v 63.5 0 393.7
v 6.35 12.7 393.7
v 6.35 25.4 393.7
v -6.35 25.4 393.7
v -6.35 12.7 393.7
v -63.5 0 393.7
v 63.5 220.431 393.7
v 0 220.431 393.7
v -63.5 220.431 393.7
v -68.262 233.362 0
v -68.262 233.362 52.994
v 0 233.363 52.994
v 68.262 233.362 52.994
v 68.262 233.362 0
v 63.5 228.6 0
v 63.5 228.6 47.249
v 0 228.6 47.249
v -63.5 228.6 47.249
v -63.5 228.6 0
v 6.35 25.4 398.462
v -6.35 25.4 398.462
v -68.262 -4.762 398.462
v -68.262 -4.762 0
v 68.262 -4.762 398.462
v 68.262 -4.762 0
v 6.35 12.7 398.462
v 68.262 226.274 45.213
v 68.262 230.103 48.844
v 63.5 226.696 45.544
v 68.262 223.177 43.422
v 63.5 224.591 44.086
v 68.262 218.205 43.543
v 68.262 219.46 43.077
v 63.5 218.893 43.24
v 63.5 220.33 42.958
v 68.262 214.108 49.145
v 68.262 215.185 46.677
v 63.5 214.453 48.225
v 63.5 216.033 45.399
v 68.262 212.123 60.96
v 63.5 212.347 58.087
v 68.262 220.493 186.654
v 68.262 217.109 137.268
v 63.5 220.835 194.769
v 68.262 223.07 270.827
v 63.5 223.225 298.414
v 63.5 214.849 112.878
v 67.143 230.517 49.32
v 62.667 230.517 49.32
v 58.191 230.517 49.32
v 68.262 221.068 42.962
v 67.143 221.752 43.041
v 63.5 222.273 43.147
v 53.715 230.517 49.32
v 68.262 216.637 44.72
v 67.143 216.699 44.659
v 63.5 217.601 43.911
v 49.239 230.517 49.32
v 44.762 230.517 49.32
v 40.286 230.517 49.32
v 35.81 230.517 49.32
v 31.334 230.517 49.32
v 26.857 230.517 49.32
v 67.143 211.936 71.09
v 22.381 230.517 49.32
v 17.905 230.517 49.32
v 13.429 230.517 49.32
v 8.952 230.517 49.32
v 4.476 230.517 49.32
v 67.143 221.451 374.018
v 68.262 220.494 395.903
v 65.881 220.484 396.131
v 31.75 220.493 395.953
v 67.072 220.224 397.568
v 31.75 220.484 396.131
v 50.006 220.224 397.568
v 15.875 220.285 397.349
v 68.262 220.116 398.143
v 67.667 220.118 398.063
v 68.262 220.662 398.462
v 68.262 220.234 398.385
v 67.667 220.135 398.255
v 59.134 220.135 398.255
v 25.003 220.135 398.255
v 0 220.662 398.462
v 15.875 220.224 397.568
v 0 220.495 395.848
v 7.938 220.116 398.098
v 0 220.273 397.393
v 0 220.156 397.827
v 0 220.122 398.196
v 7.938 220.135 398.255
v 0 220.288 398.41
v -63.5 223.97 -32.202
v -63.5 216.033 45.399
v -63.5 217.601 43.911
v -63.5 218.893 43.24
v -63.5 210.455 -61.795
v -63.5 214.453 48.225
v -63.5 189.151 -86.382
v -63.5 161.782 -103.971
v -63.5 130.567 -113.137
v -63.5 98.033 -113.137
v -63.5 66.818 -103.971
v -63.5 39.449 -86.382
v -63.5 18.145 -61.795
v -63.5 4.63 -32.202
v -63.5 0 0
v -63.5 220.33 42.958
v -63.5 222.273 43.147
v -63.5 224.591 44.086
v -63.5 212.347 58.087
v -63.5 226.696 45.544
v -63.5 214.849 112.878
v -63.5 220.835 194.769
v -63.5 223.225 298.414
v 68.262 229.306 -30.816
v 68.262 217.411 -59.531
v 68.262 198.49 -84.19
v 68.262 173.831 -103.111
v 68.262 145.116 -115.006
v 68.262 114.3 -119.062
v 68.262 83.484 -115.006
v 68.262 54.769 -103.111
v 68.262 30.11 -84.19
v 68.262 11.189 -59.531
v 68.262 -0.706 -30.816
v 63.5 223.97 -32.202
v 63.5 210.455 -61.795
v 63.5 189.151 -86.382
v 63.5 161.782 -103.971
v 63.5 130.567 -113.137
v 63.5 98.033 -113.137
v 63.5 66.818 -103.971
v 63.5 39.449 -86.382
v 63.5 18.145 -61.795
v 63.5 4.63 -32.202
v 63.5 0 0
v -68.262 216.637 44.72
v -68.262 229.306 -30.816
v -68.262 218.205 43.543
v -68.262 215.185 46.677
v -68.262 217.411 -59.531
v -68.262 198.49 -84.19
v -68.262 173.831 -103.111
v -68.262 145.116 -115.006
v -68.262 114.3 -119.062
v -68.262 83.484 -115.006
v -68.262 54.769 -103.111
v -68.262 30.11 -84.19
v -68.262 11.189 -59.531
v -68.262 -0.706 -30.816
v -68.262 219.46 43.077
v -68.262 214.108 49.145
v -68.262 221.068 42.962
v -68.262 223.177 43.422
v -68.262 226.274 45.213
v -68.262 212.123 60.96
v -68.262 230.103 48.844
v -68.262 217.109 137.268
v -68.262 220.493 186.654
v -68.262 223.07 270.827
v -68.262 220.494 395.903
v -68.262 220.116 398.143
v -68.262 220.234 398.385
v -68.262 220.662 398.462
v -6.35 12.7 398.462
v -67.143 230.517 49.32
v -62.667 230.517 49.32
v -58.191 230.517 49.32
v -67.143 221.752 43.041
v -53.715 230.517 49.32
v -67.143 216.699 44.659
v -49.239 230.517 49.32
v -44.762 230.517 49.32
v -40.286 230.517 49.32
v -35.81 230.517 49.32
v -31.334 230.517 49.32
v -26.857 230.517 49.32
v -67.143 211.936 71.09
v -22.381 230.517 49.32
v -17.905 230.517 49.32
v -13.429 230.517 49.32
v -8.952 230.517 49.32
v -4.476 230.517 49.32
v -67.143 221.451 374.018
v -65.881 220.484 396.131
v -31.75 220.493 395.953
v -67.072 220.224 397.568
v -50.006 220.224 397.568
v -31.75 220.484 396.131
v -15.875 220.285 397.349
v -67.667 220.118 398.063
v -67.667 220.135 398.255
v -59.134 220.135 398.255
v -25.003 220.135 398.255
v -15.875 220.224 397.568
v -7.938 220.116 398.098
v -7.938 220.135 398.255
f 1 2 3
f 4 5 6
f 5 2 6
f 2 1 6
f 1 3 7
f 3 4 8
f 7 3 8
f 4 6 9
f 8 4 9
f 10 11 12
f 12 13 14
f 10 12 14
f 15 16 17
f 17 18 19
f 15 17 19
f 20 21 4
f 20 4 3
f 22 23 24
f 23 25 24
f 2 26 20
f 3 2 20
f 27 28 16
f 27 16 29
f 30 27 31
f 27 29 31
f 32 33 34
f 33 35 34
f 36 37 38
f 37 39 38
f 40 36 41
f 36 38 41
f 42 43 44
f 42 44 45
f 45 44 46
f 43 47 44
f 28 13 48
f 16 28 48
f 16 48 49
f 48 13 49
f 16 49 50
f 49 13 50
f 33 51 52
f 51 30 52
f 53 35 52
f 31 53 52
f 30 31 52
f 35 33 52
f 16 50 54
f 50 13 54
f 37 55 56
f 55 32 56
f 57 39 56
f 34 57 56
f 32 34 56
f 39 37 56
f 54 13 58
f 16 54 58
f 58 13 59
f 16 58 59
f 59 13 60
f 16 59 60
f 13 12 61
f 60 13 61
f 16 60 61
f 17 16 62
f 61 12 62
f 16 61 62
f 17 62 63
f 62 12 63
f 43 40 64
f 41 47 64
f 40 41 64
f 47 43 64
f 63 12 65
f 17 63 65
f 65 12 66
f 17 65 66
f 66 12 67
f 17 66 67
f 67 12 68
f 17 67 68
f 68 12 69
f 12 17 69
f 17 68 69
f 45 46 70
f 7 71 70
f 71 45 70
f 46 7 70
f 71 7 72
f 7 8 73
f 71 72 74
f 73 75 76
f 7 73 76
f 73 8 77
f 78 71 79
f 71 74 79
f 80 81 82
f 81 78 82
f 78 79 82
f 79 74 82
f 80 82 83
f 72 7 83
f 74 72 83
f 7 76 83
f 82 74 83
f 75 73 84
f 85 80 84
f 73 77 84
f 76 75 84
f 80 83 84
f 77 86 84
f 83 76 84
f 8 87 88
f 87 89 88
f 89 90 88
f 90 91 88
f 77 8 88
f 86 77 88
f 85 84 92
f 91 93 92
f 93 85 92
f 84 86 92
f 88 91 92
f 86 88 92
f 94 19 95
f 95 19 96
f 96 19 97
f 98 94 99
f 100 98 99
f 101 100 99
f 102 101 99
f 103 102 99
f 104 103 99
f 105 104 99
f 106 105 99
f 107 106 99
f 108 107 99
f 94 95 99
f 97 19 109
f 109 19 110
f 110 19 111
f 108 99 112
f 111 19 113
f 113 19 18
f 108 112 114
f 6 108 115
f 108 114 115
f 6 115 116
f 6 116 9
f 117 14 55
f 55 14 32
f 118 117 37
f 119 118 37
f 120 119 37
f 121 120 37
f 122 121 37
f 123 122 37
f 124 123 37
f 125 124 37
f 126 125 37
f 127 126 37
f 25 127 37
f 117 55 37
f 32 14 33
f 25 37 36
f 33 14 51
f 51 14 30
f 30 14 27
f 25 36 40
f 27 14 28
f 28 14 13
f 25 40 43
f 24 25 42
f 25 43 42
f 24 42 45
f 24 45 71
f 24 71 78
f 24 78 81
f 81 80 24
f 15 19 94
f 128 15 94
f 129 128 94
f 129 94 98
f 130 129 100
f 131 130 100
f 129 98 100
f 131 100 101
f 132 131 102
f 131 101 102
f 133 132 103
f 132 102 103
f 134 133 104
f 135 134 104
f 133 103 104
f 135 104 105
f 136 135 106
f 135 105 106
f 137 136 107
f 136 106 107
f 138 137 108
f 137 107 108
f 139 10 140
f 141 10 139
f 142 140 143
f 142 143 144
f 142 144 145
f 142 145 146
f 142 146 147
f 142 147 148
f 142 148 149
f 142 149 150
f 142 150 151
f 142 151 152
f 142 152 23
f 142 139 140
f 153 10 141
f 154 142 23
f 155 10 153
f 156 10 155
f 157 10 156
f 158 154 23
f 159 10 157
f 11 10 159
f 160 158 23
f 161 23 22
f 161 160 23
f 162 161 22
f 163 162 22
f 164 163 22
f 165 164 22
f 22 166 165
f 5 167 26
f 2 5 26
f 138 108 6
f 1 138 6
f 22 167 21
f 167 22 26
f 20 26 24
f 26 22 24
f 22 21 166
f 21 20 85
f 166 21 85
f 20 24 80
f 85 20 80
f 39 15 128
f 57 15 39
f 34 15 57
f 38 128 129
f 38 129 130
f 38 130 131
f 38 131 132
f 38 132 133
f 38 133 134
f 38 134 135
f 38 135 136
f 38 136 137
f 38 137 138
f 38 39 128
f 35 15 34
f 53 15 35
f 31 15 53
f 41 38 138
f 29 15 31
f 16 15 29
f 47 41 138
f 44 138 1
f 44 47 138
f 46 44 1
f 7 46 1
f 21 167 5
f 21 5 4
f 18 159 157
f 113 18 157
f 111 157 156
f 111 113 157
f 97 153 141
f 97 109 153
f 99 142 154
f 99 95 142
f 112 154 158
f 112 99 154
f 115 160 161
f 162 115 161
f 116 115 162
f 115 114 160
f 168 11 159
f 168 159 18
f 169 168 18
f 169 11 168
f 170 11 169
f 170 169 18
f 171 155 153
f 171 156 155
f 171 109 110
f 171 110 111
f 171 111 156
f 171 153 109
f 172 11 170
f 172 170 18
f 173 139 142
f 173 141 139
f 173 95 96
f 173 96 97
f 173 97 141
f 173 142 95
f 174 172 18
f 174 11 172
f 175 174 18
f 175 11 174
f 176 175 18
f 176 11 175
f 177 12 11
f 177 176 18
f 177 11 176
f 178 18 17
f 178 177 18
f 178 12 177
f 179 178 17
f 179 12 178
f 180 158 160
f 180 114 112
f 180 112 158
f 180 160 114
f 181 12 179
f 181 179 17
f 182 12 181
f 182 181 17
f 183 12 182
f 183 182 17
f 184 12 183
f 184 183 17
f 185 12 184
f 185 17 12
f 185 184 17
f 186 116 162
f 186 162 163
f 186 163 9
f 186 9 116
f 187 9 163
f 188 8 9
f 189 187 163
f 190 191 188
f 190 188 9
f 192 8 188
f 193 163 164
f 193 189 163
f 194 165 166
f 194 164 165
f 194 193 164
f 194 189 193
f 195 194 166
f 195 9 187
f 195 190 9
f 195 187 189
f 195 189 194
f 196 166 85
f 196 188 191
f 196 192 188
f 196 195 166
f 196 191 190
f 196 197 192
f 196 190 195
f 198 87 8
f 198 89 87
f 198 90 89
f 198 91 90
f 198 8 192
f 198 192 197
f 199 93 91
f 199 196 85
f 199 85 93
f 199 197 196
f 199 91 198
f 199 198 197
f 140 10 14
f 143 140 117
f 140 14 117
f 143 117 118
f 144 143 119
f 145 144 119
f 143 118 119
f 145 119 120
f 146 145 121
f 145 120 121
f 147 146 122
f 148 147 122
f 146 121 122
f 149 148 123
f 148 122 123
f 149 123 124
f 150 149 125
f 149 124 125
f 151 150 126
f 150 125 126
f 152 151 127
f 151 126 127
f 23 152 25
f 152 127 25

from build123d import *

# Parameters (mm, degrees)
BOSS_EXTRUDE1_DEPTH            = 63.5
BOSS_EXTRUDE1_DEPTH_BACK       = 63.5
CUT_EXTRUDE1_REACH             = 573.246
SKETCH4_W                      = 12.7
SKETCH4_H                      = 12.7
BOSS_EXTRUDE3_DEPTH            = 4.7625
CUT_EXTRUDE2_REACH             = 468.787
CUT_EXTRUDE2_DIRECTION_2_REACH = 468.787
CUT_EXTRUDE3_DEPTH             = 136.525


with BuildPart() as part:
    # Sketch2 → Boss-Extrude1 (new, two sides: drawn at the far end of the back side and taken through both)
    with BuildSketch(Plane(origin=(0, 0, 0), x_dir=(0, 0, -1), z_dir=(1, 0, 0)).offset(-BOSS_EXTRUDE1_DEPTH_BACK)):
        with BuildLine():
            Line((0, -4.7625), (-398.4625, -4.7625))
            Line((-398.4625, -4.7625), (-398.4625, 233.3625))
            Line((-398.4625, 233.3625), (0, 233.3625))
            ThreePointArc((0, 233.3625), (119.0625, 114.3), (0, -4.7625))
        make_face()
        with BuildLine():
            Line((0, 0), (-393.7, 0))
            Line((-393.7, 0), (-393.7, 228.6))
            Line((-393.7, 228.6), (0, 228.6))
            ThreePointArc((0, 228.6), (114.3, 114.3), (0, 0))
        make_face(mode=Mode.SUBTRACT)
    extrude(amount=BOSS_EXTRUDE1_DEPTH + BOSS_EXTRUDE1_DEPTH_BACK)

    # Sketch4 → Cut-Extrude1 (cut, up to next)
    with BuildSketch(Plane.XY.offset(398.4625), mode=Mode.PRIVATE) as cut_extrude1_sk1:
        with Locations((0, 19.05)):
            Rectangle(SKETCH4_W, SKETCH4_H)
    cut_extrude1_tool1 = extrude(cut_extrude1_sk1.sketch, amount=-CUT_EXTRUDE1_REACH, mode=Mode.PRIVATE) & part.part
    add(cut_extrude1_tool1.solids().sort_by_distance((0, 19.05, 398.4625))[0], mode=Mode.SUBTRACT)

    # Sketch9 → Boss-Extrude3 (add)
    with BuildSketch(Plane(origin=(63.5, 0, 0), x_dir=(0, 0, -1), z_dir=(1, 0, 0))):
        with BuildLine():
            Line((-398.4625, 233.3625), (0, 233.3625))
            ThreePointArc((0, 233.3625), (119.0625, 114.3), (0, -4.7625))
            Line((0, -4.7625), (-398.4625, -4.7625))
            Line((-398.4625, -4.7625), (-398.4625, 233.3625))
        make_face()
    boss_extrude3 = extrude(amount=BOSS_EXTRUDE3_DEPTH)

    # Mirror1: Boss-Extrude3 across plane
    add(boss_extrude3.mirror(Plane(origin=(0, 0, 0), x_dir=(0, 0, 1), z_dir=(1, 0, 0))))

    # Sketch11 → Cut-Extrude2 (cut, up to next)
    with BuildSketch(Plane(origin=(0, 0, 0), x_dir=(0, 0, -1), z_dir=(1, 0, 0)), mode=Mode.PRIVATE) as cut_extrude2_sk1:
        with BuildLine():
            Line((-398.4625, 220.6625), (-398.549393223, 221.103452286))
            add(Edge.make_bspline(
                [(-398.549393223, 221.103452286), (-398.232700595, 221.211009466), (-396.970901441, 221.63954978), (-394.14642109, 222.600485882), (-389.462953517, 224.150302439), (-382.969998464, 226.259749178), (-374.723245355, 228.841368447), (-364.80000481, 231.813872481), (-353.297978696, 235.083165457), (-340.328032508, 238.545255758), (-326.021148985, 242.094575026), (-310.521429797, 245.617549826), (-293.994927933, 249.024771645), (-276.614504443, 252.20432036), (-258.567862768, 255.061254061), (-240.053343741, 257.520201331), (-221.279209389, 259.500514547), (-202.447059388, 260.937616248), (-183.64181928, 261.853164618), (-165.066079575, 261.889242872), (-146.980070346, 260.902418125), (-129.758757053, 258.98503391), (-113.629585221, 256.246806811), (-98.804456806, 252.805079969), (-85.468656161, 248.825528286), (-73.777495343, 244.484590441), (-63.856217252, 239.956374948), (-55.798201624, 235.414103694), (-49.638608789, 231.017198213), (-45.410140529, 226.860803831), (-42.982866367, 222.931348779), (-42.778551081, 218.986296857), (-45.130374502, 215.836723639), (-49.23769494, 213.876038864), (-54.878489437, 212.601675942), (-62.141431937, 211.952589942), (-70.954497433, 211.854882503), (-81.233579013, 212.250908039), (-92.863351661, 213.05360896), (-105.724740235, 214.17353372), (-119.693166749, 215.488554617), (-134.64317648, 216.89092489), (-150.445709996, 218.26416395), (-166.970044114, 219.486485379), (-184.211284992, 220.428545699), (-202.015771527, 221.118607839), (-220.195805294, 221.829251021), (-238.435682057, 222.413221363), (-256.531925379, 222.857510837), (-274.291608724, 223.140033413), (-291.519175726, 223.252027693), (-308.022545069, 223.203320199), (-323.615565221, 223.020606612), (-338.118364345, 222.71075189), (-351.360747498, 222.338100855), (-363.191371257, 221.908988988), (-373.444754133, 221.495841487), (-382.066215664, 221.0476688), (-388.753640958, 220.841691742), (-393.905599593, 220.266487962), (-396.455855294, 220.648579963), (-398.422990842, 219.934638372), (-398.453149809, 220.490245125), (-398.4625, 220.6625)],
                knots=[0, 0, 0, 0, 0.001371577, 0.005464776, 0.012234802, 0.021601969, 0.033461345, 0.04767125, 0.064081318, 0.082496261, 0.102719149, 0.124527079, 0.147675648, 0.171912573, 0.19697838, 0.222596912, 0.248496767, 0.274385101, 0.300041178, 0.325689988, 0.350525088, 0.374279703, 0.396711254, 0.417576734, 0.436654006, 0.45374439, 0.468679994, 0.481329415, 0.491630702, 0.499615789, 0.505546281, 0.510184984, 0.514824194, 0.520701508, 0.52851604, 0.538465752, 0.550542609, 0.564643256, 0.580638139, 0.598344876, 0.617584458, 0.638174401, 0.65992209, 0.682632113, 0.706120665, 0.730727383, 0.755700244, 0.780731769, 0.805564463, 0.829932396, 0.853570292, 0.876213105, 0.897609987, 0.917519394, 0.935698347, 0.951942678, 0.966047159, 0.97783994, 0.987174002, 0.993931501, 0.998018399, 0.999385644, 1, 1, 1, 1], degree=3))
        make_face()
    cut_extrude2_tool1 = extrude(cut_extrude2_sk1.sketch, amount=-CUT_EXTRUDE2_REACH, mode=Mode.PRIVATE) & part.part
    add(cut_extrude2_tool1.solids().sort_by_distance((0, 236.327035, 192.134804))[0], mode=Mode.SUBTRACT)

    # Sketch11 → Cut-Extrude2 direction 2 (cut, up to next)
    with BuildSketch(Plane(origin=(0, 0, 0), x_dir=(0, 0, -1), z_dir=(1, 0, 0)), mode=Mode.PRIVATE) as cut_extrude2_direction_2_sk1:
        with BuildLine():
            Line((-398.4625, 220.6625), (-398.549393223, 221.103452286))
            add(Edge.make_bspline(
                [(-398.549393223, 221.103452286), (-398.232700595, 221.211009466), (-396.970901441, 221.63954978), (-394.14642109, 222.600485882), (-389.462953517, 224.150302439), (-382.969998464, 226.259749178), (-374.723245355, 228.841368447), (-364.80000481, 231.813872481), (-353.297978696, 235.083165457), (-340.328032508, 238.545255758), (-326.021148985, 242.094575026), (-310.521429797, 245.617549826), (-293.994927933, 249.024771645), (-276.614504443, 252.20432036), (-258.567862768, 255.061254061), (-240.053343741, 257.520201331), (-221.279209389, 259.500514547), (-202.447059388, 260.937616248), (-183.64181928, 261.853164618), (-165.066079575, 261.889242872), (-146.980070346, 260.902418125), (-129.758757053, 258.98503391), (-113.629585221, 256.246806811), (-98.804456806, 252.805079969), (-85.468656161, 248.825528286), (-73.777495343, 244.484590441), (-63.856217252, 239.956374948), (-55.798201624, 235.414103694), (-49.638608789, 231.017198213), (-45.410140529, 226.860803831), (-42.982866367, 222.931348779), (-42.778551081, 218.986296857), (-45.130374502, 215.836723639), (-49.23769494, 213.876038864), (-54.878489437, 212.601675942), (-62.141431937, 211.952589942), (-70.954497433, 211.854882503), (-81.233579013, 212.250908039), (-92.863351661, 213.05360896), (-105.724740235, 214.17353372), (-119.693166749, 215.488554617), (-134.64317648, 216.89092489), (-150.445709996, 218.26416395), (-166.970044114, 219.486485379), (-184.211284992, 220.428545699), (-202.015771527, 221.118607839), (-220.195805294, 221.829251021), (-238.435682057, 222.413221363), (-256.531925379, 222.857510837), (-274.291608724, 223.140033413), (-291.519175726, 223.252027693), (-308.022545069, 223.203320199), (-323.615565221, 223.020606612), (-338.118364345, 222.71075189), (-351.360747498, 222.338100855), (-363.191371257, 221.908988988), (-373.444754133, 221.495841487), (-382.066215664, 221.0476688), (-388.753640958, 220.841691742), (-393.905599593, 220.266487962), (-396.455855294, 220.648579963), (-398.422990842, 219.934638372), (-398.453149809, 220.490245125), (-398.4625, 220.6625)],
                knots=[0, 0, 0, 0, 0.001371577, 0.005464776, 0.012234802, 0.021601969, 0.033461345, 0.04767125, 0.064081318, 0.082496261, 0.102719149, 0.124527079, 0.147675648, 0.171912573, 0.19697838, 0.222596912, 0.248496767, 0.274385101, 0.300041178, 0.325689988, 0.350525088, 0.374279703, 0.396711254, 0.417576734, 0.436654006, 0.45374439, 0.468679994, 0.481329415, 0.491630702, 0.499615789, 0.505546281, 0.510184984, 0.514824194, 0.520701508, 0.52851604, 0.538465752, 0.550542609, 0.564643256, 0.580638139, 0.598344876, 0.617584458, 0.638174401, 0.65992209, 0.682632113, 0.706120665, 0.730727383, 0.755700244, 0.780731769, 0.805564463, 0.829932396, 0.853570292, 0.876213105, 0.897609987, 0.917519394, 0.935698347, 0.951942678, 0.966047159, 0.97783994, 0.987174002, 0.993931501, 0.998018399, 0.999385644, 1, 1, 1, 1], degree=3))
        make_face()
    cut_extrude2_direction_2_tool1 = extrude(cut_extrude2_direction_2_sk1.sketch, amount=CUT_EXTRUDE2_DIRECTION_2_REACH, mode=Mode.PRIVATE) & part.part
    add(cut_extrude2_direction_2_tool1.solids().sort_by_distance((0, 236.327035, 192.134804))[0], mode=Mode.SUBTRACT)


with BuildPart() as cut_extrude2_piece_1:
    # of the separate pieces the step leaves, piece 1, a body of its own (cut_extrude2_pieces)
    add(part.part.solids().sort_by_distance((68.2625, 233.3625, 0))[0])


with BuildPart() as cut_extrude2_piece_2:
    # of the separate pieces the step leaves, piece 2, a body of its own (cut_extrude2_pieces)
    add(part.part.solids().sort_by_distance((68.2625, 233.3625, 359.323803316))[0])

    # Sketch12 → Cut-Extrude3 (cut)
    with BuildSketch(Plane.ZY.offset(68.2625)):
        with BuildLine():
            Line((398.4625, 221.132963555), (398.4625, 233.3625))
            Line((398.4625, 233.3625), (359.323803288, 233.362500008))
            add(Edge.make_bspline(
                [(359.323803288, 233.362500008), (361.320647135, 232.795545243), (366.644911042, 231.261231316), (374.723245355, 228.841368447), (382.969998464, 226.259749178), (389.462953517, 224.150302439), (394.14642109, 222.600485882), (396.941942115, 221.649402234), (398.174771889, 221.230683977), (398.4625, 221.132963555)],
                knots=[0.000125443, 0.000125443, 0.000125443, 0.000125443, 0.008637848, 0.022847753, 0.034707128, 0.044074296, 0.050844322, 0.054937521, 0.056183654, 0.056183654, 0.056183654, 0.056183654], degree=3))
        make_face()
    extrude(amount=-CUT_EXTRUDE3_DEPTH, mode=Mode.SUBTRACT)


solid = cut_extrude2_piece_1.part
